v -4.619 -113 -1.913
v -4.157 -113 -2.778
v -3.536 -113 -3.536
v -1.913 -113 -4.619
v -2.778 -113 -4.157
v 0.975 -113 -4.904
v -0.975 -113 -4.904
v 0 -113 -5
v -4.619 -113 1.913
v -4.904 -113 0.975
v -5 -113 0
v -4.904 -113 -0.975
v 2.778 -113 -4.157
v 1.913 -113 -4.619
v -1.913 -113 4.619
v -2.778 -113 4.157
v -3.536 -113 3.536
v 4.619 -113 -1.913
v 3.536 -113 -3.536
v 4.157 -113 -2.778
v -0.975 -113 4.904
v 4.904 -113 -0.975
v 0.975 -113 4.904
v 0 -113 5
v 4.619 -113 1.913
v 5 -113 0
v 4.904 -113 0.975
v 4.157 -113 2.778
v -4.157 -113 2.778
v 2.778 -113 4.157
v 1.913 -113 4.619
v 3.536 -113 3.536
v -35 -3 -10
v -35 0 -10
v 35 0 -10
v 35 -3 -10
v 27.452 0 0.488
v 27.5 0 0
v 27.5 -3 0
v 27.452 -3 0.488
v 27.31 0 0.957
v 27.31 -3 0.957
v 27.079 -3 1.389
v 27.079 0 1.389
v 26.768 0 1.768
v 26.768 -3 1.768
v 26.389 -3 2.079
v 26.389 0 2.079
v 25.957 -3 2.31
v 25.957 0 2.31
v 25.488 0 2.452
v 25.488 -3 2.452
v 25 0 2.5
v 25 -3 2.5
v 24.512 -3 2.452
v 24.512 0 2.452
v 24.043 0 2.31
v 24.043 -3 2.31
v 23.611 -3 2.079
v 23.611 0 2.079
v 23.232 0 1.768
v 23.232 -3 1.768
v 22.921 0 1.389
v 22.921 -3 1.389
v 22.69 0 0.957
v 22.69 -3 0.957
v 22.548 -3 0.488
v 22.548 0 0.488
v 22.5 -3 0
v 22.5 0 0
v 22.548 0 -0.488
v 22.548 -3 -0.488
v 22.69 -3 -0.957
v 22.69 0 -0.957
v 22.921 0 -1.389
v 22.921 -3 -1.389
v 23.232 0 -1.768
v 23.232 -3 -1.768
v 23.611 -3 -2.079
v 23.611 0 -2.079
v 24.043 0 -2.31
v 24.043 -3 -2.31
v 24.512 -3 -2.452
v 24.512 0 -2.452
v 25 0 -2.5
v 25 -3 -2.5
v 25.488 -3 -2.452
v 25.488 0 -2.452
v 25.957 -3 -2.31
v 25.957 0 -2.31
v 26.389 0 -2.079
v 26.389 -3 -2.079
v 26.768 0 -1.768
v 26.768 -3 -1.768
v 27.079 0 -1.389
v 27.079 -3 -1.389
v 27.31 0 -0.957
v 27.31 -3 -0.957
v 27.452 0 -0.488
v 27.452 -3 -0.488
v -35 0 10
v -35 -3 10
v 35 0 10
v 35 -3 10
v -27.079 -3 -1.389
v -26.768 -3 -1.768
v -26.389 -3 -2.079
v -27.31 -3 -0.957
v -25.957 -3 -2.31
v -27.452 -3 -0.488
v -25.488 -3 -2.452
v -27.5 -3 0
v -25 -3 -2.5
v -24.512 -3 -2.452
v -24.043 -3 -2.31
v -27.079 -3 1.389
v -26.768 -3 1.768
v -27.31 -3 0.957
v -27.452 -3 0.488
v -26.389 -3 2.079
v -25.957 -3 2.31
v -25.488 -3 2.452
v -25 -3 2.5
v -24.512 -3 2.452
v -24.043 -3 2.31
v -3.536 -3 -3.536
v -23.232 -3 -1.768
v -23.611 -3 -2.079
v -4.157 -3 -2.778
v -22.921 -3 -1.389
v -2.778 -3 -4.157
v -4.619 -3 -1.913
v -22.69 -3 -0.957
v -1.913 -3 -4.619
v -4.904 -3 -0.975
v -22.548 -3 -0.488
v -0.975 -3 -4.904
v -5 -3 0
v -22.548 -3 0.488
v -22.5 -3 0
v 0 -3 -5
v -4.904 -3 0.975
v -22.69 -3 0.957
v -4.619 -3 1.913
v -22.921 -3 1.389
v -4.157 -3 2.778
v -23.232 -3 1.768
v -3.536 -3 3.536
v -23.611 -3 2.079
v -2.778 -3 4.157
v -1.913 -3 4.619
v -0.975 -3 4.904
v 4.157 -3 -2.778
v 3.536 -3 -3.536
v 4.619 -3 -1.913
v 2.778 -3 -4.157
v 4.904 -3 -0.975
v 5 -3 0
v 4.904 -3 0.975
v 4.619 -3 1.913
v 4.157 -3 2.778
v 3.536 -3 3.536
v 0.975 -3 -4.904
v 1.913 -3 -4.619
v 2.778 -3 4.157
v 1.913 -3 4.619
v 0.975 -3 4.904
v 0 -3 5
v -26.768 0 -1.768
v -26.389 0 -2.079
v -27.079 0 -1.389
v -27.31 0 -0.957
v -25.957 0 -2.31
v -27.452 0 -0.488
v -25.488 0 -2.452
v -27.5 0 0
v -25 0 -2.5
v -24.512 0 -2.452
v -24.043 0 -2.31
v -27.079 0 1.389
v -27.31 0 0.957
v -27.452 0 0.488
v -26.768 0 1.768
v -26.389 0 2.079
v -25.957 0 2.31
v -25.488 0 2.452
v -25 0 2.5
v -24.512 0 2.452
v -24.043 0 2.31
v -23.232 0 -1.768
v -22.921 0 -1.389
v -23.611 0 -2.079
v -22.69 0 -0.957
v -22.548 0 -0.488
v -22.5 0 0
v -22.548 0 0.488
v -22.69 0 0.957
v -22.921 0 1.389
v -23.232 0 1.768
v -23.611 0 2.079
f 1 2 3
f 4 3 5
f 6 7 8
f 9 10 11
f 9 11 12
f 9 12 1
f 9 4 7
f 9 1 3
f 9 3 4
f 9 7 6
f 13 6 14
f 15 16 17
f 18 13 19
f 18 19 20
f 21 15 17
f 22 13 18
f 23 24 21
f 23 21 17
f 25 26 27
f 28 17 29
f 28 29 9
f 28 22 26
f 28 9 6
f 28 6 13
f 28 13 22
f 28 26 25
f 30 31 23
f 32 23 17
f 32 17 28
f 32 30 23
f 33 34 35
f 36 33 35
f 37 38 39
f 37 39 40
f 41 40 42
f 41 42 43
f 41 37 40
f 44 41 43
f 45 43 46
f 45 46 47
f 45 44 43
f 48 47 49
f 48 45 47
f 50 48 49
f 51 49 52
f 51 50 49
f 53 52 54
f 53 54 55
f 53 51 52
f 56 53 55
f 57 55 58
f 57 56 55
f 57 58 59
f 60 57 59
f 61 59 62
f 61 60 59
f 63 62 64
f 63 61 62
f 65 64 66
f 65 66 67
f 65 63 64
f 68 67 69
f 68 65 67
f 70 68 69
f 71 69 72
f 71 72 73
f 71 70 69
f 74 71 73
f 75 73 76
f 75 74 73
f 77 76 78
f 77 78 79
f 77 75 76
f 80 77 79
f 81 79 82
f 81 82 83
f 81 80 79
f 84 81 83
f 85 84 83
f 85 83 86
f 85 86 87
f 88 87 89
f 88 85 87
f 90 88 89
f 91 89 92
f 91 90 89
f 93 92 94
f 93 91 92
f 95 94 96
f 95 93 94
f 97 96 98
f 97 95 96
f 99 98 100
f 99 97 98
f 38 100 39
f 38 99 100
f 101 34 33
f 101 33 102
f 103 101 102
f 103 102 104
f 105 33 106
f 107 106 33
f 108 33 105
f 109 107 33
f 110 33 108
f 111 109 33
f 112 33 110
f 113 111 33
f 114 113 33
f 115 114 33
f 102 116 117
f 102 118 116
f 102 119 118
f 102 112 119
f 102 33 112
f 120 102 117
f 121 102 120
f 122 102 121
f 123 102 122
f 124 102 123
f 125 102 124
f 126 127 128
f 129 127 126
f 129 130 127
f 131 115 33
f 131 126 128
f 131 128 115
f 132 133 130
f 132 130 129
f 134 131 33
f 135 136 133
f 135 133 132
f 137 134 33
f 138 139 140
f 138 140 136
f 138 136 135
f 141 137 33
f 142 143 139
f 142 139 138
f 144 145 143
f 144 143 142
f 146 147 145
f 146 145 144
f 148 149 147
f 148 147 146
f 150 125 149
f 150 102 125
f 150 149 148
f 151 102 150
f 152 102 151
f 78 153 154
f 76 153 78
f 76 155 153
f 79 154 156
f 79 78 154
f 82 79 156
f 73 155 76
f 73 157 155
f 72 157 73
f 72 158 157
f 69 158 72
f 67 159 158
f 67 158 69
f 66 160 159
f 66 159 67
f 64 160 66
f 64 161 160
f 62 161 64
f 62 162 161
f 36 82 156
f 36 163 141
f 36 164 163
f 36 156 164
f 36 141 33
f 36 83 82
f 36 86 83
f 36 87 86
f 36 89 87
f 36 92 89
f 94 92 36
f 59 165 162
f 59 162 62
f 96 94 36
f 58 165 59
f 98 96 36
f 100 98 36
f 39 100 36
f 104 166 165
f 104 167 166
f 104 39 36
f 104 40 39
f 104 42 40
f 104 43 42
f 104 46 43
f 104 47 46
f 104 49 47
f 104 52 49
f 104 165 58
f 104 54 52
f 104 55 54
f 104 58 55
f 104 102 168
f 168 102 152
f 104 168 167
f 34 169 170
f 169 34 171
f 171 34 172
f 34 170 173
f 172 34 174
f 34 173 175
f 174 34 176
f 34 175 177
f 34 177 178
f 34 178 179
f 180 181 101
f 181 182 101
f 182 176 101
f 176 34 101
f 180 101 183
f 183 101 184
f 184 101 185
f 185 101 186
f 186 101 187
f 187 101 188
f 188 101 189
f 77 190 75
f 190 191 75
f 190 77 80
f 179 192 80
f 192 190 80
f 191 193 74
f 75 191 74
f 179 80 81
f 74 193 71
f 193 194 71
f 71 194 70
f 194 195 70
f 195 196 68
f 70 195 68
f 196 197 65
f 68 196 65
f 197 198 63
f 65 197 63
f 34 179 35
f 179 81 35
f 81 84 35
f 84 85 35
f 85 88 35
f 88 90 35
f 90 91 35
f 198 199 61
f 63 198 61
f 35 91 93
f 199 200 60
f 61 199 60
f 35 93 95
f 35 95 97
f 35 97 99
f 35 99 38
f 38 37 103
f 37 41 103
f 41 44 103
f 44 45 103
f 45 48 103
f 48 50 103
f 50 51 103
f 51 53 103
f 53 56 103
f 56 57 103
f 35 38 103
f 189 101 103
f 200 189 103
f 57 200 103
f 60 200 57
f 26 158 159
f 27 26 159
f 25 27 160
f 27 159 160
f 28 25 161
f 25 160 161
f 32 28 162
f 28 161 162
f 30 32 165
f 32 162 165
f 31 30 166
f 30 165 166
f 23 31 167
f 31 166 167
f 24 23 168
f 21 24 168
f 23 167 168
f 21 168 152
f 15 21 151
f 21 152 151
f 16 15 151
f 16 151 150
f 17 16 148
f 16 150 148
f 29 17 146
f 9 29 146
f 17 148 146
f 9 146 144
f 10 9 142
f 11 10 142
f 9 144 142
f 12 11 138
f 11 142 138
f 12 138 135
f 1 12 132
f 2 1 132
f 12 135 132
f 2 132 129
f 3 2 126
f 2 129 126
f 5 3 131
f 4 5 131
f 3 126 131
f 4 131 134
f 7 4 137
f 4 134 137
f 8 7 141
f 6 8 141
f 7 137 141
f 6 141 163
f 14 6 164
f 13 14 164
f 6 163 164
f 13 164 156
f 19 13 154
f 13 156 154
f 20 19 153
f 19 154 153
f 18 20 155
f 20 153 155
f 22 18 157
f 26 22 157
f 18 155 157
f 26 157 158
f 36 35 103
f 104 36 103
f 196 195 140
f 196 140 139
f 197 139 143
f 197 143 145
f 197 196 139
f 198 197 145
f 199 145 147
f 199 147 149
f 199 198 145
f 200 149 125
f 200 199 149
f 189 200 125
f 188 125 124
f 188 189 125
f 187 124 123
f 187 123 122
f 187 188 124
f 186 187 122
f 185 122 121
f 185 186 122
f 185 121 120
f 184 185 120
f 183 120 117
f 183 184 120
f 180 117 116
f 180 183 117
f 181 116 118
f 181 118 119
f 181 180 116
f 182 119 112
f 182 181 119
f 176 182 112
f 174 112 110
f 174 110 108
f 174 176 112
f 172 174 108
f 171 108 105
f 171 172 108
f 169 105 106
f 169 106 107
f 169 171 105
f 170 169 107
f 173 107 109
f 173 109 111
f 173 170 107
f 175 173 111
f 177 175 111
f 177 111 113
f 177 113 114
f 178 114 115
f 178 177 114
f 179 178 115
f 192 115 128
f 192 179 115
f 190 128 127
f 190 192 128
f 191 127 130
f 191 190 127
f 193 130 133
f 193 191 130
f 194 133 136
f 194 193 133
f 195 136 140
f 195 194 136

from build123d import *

# Parameters (mm, degrees)
F0_W     = 70
F0_H     = 20
F0_R     = 2.5
F1_DEPTH = 3
F2_R     = 5
F3_DEPTH = 110


with BuildPart() as f1:
    # F0 (on Front) → F1 (new body)
    with BuildSketch(Plane.XZ):
        Rectangle(F0_W, F0_H)
        with Locations((-25, 0)):
            Circle(F0_R, mode=Mode.SUBTRACT)
        with Locations((25, 0)):
            Circle(F0_R, mode=Mode.SUBTRACT)
    extrude(amount=F1_DEPTH)

    # F2 (on face) → F3 (join)
    with BuildSketch(Plane.XZ.offset(3)):
        Circle(F2_R)
    extrude(amount=F3_DEPTH)


solid = f1.part
